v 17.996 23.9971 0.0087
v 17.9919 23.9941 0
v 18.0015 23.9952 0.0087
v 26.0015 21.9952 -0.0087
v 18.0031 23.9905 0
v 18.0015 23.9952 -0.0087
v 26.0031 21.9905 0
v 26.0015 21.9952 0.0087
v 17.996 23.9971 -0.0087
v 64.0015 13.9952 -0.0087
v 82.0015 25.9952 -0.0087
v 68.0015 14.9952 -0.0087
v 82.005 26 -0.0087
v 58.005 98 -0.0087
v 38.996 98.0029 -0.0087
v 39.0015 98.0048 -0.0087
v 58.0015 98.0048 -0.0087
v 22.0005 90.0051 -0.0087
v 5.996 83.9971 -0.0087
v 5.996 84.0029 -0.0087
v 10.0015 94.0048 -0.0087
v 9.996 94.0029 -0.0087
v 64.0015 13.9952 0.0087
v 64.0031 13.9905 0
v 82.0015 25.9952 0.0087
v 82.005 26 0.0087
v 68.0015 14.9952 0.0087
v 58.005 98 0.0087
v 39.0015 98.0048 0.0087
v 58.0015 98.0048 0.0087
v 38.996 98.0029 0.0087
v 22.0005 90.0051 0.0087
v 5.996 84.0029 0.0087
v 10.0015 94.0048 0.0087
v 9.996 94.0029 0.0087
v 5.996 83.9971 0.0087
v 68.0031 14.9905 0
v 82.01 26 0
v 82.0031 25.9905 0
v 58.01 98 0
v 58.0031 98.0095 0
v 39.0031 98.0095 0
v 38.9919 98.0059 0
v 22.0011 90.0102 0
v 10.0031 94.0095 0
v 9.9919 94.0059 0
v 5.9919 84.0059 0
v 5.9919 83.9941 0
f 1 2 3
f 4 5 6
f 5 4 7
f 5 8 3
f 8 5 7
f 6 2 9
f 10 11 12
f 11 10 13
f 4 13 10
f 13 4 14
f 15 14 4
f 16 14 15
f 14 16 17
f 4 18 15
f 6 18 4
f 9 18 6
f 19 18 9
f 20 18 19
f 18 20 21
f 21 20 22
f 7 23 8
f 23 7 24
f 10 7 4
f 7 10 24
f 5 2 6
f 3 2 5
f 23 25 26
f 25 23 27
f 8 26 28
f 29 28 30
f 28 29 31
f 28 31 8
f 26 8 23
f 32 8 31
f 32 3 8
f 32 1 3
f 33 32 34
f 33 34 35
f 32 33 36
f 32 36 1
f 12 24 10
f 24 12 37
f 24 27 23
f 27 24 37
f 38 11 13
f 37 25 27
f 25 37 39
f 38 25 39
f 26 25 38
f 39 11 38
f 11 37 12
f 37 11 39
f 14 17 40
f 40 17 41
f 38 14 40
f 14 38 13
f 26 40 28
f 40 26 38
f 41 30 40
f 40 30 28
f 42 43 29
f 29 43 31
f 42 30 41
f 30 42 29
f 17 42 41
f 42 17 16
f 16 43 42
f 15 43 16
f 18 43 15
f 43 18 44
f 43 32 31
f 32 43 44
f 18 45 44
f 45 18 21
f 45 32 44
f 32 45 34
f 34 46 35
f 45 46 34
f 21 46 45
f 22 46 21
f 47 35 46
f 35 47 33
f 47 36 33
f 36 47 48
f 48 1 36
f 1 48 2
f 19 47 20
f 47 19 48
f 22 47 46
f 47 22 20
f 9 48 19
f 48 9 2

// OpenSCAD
color([0.6652757233710683,0.22263754843686523,0.08942086350367451]) hull(){
    translate([18,24]) sphere(0.01);
    translate([26,22]) sphere(0.01);
    translate([64,14]) sphere(0.01);
}
color([0.6195232841458308,0.9036720387350747,0.7222923954673625]) hull(){
    translate([18,24]) sphere(0.01);
    translate([64,14]) sphere(0.01);
    translate([68,15]) sphere(0.01);
}
color([0.6665075097113882,0.5421139713900744,0.6943978877819516]) hull(){
    translate([18,24]) sphere(0.01);
    translate([68,15]) sphere(0.01);
    translate([82,26]) sphere(0.01);
}
color([0.9269770591996176,0.12480324665016229,0.8422397758241813]) hull(){
    translate([42,29]) sphere(0.01);
    translate([18,24]) sphere(0.01);
    translate([82,26]) sphere(0.01);
}
color([0.028249143050612435,0.8554899328562455,0.6212809598996976]) hull(){
    translate([58,33]) sphere(0.01);
    translate([42,29]) sphere(0.01);
    translate([82,26]) sphere(0.01);
}
color([0.6435486749275994,0.4857227915978113,0.2898251547629681]) hull(){
    translate([58,33]) sphere(0.01);
    translate([82,26]) sphere(0.01);
    translate([58,98]) sphere(0.01);
}
color([0.21709076393122206,0.4979948584580751,0.6176241526046676]) hull(){
    translate([58,33]) sphere(0.01);
    translate([58,98]) sphere(0.01);
    translate([42,29]) sphere(0.01);
}
color([0.4722249532281336,0.7228331534363125,0.6109414561657331]) hull(){
    translate([44,47]) sphere(0.01);
    translate([42,29]) sphere(0.01);
    translate([58,98]) sphere(0.01);
}
color([0.5330085163671737,0.6769359871291822,0.5973748769978083]) hull(){
    translate([44,47]) sphere(0.01);
    translate([18,24]) sphere(0.01);
    translate([42,29]) sphere(0.01);
}
color([0.14460255854654236,0.21273280877313017,0.8417179364881341]) hull(){
    translate([44,55]) sphere(0.01);
    translate([44,47]) sphere(0.01);
    translate([58,98]) sphere(0.01);
}
color([0.6300391880279899,0.5103677782275869,0.4479627161837708]) hull(){
    translate([44,55]) sphere(0.01);
    translate([58,98]) sphere(0.01);
    translate([18,24]) sphere(0.01);
}
color([0.2903518628620462,0.1744676713524972,0.5457372127765215]) hull(){
    translate([44,55]) sphere(0.01);
    translate([18,24]) sphere(0.01);
    translate([44,47]) sphere(0.01);
}
color([0.6340658375422632,0.7004271366493812,0.690956934786038]) hull(){
    translate([50,93]) sphere(0.01);
    translate([18,24]) sphere(0.01);
    translate([58,98]) sphere(0.01);
}
color([0.013948469234104865,0.8018456354370093,0.2607079205191076]) hull(){
    translate([50,93]) sphere(0.01);
    translate([58,98]) sphere(0.01);
    translate([39,98]) sphere(0.01);
}
color([0.01899716010339858,0.7507132946374245,0.44168653561511173]) hull(){
    translate([50,93]) sphere(0.01);
    translate([39,98]) sphere(0.01);
    translate([18,24]) sphere(0.01);
}
color([0.1668653701245908,0.45955837321901094,0.7876756969907556]) hull(){
    translate([18,24]) sphere(0.01);
    translate([39,98]) sphere(0.01);
    translate([22,90]) sphere(0.01);
}
color([0.09564527702692727,0.06733136152719421,0.7816649665975636]) hull(){
    translate([18,58]) sphere(0.01);
    translate([18,24]) sphere(0.01);
    translate([22,90]) sphere(0.01);
}
color([0.030385075649315252,0.33346286891595733,0.08647112242809318]) hull(){
    translate([18,58]) sphere(0.01);
    translate([22,90]) sphere(0.01);
    translate([10,94]) sphere(0.01);
}
color([0.8161439782233904,0.05657658467482607,0.8243668117903717]) hull(){
    translate([18,58]) sphere(0.01);
    translate([10,94]) sphere(0.01);
    translate([18,24]) sphere(0.01);
}
color([0.05808931884644186,0.6181904095369413,0.1426995958976538]) hull(){
    translate([18,24]) sphere(0.01);
    translate([10,94]) sphere(0.01);
    translate([6,84]) sphere(0.01);
}
